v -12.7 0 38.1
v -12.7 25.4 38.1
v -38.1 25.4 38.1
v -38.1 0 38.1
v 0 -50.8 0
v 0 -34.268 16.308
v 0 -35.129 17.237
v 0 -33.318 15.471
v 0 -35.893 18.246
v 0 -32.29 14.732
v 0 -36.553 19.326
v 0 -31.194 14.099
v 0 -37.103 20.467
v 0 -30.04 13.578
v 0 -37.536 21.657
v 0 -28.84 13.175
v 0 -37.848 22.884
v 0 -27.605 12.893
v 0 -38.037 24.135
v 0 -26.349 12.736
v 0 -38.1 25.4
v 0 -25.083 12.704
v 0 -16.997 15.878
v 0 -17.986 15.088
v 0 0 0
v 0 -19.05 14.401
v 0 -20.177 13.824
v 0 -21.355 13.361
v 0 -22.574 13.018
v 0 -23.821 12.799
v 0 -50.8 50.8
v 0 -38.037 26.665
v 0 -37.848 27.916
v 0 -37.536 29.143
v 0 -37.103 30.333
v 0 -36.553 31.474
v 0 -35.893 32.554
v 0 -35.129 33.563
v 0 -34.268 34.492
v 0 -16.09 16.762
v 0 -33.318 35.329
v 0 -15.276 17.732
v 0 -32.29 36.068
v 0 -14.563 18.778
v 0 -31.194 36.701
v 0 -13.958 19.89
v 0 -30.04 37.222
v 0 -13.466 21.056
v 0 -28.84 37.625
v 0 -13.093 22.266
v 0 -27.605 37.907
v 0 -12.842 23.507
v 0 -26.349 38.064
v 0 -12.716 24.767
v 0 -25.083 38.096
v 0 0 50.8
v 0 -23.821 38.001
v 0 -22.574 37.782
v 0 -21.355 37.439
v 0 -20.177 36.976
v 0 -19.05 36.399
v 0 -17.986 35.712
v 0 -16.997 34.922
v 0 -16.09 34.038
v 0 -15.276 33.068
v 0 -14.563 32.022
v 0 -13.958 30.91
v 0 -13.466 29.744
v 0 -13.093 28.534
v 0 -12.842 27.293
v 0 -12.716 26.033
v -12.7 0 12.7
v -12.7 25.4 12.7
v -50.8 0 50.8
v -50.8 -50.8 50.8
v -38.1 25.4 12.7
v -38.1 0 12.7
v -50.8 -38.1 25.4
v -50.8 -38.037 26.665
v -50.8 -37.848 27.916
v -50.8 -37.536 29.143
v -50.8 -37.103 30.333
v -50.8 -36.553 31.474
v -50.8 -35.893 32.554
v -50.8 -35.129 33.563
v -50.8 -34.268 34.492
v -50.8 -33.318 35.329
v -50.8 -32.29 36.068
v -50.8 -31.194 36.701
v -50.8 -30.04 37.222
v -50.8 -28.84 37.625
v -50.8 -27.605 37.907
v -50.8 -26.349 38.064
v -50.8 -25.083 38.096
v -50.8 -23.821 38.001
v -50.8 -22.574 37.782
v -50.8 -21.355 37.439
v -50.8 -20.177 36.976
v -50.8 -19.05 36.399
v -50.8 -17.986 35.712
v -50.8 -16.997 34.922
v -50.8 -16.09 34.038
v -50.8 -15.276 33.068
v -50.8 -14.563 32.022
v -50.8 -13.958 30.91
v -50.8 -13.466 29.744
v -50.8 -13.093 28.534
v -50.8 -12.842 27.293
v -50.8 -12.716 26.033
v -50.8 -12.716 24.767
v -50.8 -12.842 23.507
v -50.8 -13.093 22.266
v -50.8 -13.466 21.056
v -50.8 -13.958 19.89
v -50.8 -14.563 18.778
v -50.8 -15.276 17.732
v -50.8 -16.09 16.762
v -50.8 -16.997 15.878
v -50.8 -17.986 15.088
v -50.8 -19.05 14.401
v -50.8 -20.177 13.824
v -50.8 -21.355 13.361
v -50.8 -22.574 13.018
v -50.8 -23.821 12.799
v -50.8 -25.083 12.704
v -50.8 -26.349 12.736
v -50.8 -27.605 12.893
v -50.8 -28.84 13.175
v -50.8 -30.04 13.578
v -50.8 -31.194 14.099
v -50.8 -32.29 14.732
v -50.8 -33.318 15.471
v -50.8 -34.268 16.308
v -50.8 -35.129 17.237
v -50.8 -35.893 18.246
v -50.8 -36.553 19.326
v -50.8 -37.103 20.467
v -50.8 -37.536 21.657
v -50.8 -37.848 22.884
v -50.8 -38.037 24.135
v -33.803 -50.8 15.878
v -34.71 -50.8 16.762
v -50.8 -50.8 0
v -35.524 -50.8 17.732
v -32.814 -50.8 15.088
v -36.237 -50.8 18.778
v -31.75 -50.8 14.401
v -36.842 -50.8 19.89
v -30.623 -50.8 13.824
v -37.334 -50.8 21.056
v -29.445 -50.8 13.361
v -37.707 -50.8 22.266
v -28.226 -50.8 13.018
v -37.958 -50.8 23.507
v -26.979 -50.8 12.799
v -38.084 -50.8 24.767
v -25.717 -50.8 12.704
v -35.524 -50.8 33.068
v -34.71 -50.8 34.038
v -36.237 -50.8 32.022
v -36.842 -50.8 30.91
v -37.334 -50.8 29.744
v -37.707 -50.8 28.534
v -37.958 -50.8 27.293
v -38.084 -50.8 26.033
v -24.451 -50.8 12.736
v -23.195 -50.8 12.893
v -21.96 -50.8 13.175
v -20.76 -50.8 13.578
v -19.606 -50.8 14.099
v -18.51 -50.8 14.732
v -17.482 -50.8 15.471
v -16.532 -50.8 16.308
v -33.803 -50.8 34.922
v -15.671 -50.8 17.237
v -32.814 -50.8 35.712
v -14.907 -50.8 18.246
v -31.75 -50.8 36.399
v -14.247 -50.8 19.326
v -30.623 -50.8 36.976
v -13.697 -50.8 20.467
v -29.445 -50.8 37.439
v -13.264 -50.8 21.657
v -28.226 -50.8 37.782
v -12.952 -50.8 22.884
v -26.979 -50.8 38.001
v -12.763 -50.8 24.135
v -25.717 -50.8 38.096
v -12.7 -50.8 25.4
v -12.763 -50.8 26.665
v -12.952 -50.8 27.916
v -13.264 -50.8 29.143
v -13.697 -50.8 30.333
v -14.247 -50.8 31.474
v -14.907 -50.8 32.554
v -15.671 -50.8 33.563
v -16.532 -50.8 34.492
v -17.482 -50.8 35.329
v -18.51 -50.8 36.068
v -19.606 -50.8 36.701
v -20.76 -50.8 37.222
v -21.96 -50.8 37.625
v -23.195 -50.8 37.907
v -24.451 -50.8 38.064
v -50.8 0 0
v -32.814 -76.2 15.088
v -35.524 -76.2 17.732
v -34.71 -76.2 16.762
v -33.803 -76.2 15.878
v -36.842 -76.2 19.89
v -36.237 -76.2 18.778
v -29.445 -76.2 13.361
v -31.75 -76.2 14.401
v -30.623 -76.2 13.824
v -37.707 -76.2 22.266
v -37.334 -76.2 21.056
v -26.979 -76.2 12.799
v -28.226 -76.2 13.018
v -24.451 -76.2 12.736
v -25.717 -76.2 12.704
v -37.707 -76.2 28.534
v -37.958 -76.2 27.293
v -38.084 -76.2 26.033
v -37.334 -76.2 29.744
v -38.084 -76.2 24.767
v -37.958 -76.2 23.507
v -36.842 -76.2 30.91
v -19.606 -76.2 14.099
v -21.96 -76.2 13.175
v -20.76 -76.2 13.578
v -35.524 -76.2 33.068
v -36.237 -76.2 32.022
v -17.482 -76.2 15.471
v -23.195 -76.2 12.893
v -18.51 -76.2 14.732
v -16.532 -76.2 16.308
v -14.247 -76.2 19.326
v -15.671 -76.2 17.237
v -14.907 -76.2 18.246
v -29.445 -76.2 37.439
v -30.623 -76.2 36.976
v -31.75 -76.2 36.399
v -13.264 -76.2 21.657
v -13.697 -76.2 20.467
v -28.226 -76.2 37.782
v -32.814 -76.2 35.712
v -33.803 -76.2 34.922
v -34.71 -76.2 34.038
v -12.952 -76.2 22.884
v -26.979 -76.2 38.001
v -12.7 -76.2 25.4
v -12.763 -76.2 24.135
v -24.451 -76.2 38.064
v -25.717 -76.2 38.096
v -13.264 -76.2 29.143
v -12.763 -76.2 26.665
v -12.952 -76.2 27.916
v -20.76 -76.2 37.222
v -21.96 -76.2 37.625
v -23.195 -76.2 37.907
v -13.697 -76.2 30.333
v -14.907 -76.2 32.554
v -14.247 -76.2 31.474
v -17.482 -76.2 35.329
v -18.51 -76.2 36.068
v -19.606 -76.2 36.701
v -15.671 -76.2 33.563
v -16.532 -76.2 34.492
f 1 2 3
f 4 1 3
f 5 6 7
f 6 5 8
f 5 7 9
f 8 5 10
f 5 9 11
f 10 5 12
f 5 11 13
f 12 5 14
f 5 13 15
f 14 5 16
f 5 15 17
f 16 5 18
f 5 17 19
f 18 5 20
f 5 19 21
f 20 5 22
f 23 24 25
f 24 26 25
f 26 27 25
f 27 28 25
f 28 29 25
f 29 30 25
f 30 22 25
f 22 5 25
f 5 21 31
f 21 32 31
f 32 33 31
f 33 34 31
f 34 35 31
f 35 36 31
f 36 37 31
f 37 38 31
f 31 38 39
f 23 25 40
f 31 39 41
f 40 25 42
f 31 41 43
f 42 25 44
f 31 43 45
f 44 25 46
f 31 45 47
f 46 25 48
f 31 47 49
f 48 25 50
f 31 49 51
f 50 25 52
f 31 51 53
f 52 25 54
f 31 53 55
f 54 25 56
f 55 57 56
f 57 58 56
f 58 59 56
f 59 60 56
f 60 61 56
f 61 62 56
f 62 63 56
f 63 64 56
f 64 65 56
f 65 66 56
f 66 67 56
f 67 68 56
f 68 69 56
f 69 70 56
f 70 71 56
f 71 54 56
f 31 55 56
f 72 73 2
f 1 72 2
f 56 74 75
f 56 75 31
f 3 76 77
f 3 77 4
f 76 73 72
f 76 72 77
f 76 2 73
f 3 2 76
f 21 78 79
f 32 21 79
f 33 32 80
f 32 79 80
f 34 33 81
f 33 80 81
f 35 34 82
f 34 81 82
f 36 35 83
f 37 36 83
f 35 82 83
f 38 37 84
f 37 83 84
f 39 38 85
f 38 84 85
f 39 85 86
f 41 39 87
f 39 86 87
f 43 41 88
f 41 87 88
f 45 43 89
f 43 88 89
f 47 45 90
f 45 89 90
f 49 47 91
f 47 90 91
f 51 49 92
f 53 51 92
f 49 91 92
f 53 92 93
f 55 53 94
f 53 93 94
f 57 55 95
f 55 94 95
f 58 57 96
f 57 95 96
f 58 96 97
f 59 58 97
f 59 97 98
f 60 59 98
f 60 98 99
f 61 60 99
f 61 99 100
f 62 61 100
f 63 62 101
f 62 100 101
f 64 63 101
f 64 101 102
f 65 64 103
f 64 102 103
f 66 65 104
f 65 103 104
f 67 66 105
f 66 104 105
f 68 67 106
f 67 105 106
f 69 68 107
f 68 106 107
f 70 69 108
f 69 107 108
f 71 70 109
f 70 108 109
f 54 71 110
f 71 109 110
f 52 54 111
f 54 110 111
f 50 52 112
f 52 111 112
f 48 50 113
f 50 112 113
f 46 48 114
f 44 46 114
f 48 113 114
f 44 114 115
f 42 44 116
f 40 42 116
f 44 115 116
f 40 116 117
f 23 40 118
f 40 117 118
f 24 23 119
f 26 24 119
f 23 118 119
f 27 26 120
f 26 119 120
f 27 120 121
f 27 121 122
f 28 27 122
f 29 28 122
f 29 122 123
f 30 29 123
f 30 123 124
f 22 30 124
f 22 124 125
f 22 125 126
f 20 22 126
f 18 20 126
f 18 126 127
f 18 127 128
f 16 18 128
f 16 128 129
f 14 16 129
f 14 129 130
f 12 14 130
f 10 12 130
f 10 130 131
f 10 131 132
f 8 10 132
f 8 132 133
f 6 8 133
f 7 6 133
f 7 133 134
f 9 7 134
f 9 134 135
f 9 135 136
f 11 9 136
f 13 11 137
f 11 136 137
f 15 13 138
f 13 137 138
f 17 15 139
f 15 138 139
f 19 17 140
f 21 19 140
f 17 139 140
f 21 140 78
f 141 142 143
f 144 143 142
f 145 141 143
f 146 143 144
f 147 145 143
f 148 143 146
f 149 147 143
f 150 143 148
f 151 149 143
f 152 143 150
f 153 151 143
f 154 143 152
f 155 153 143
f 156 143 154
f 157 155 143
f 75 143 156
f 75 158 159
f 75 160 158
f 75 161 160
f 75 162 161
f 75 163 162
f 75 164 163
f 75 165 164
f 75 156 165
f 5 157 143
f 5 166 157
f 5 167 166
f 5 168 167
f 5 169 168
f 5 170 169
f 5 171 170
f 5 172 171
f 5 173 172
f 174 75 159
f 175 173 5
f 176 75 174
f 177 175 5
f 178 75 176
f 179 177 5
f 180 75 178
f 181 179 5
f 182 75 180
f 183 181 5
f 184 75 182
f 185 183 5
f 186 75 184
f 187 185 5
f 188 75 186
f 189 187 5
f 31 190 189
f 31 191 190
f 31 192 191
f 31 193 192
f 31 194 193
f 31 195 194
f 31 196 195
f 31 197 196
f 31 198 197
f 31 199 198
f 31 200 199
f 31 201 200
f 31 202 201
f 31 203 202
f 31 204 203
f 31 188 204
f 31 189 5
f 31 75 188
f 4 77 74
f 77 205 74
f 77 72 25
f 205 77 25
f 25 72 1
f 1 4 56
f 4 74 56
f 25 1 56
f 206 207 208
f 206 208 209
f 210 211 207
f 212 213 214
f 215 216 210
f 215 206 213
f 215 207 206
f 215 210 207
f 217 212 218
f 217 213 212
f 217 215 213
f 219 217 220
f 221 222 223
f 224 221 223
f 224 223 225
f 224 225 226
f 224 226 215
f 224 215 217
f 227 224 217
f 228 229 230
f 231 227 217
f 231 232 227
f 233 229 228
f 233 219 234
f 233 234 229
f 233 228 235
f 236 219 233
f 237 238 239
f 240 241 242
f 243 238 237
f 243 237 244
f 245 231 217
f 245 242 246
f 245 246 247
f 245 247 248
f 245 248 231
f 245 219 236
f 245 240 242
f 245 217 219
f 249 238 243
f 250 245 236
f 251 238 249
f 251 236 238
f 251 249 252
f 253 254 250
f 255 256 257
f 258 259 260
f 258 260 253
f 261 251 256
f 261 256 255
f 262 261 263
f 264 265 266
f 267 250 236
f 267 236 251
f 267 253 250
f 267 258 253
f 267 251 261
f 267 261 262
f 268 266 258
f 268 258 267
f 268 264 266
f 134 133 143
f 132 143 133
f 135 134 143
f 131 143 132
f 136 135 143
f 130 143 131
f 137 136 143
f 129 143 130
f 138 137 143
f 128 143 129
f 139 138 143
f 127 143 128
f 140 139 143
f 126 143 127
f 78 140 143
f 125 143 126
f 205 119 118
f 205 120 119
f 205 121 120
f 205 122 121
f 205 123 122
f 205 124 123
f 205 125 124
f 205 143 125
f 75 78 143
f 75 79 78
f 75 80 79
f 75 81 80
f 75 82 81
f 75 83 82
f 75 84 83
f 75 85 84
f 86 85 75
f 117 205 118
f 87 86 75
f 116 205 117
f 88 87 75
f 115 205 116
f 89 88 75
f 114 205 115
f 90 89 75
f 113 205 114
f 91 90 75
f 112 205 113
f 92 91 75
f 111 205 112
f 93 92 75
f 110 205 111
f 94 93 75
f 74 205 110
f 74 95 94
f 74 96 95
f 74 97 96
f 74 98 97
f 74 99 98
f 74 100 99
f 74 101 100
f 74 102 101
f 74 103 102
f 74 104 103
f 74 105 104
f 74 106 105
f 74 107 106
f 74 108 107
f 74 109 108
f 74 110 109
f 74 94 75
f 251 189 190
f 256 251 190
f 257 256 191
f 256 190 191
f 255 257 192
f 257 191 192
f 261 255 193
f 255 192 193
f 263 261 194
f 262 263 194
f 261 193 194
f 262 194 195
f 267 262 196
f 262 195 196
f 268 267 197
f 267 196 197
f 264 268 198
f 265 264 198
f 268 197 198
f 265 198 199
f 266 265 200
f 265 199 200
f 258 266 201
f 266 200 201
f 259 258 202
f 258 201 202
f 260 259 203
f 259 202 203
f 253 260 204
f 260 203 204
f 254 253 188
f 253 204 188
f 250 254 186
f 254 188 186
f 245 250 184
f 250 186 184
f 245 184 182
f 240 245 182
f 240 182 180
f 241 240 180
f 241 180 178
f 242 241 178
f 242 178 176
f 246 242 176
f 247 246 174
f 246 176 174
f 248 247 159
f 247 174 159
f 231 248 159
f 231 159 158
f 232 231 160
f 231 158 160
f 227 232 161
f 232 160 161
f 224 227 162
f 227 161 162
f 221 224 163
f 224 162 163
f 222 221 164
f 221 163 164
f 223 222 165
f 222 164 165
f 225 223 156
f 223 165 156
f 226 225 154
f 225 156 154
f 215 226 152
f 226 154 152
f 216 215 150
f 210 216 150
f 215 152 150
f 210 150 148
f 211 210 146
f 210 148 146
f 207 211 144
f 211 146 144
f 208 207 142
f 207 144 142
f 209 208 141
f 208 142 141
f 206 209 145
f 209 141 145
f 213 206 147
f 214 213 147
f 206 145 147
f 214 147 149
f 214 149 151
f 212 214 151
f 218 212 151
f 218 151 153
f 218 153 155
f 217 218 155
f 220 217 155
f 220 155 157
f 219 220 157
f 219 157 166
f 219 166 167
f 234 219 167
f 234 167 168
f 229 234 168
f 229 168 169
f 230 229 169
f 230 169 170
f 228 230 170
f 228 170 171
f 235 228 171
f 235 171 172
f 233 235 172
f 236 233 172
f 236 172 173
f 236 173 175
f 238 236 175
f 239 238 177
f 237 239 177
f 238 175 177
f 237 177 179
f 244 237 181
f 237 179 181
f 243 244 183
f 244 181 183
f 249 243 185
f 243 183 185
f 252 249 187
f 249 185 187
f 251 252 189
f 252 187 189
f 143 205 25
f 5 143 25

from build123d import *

# Parameters (mm, degrees)
F0_W     = 50.8
F0_H     = 50.8
F1_DEPTH = 50.8
F2_R     = 12.7
F3_DEPTH = 25.4
F4_R     = 12.7
F5_DEPTH = 50.8
F6_W     = 25.4
F6_H     = 25.4
F7_DEPTH = 25.4


with BuildPart() as f1:
    # F0 (on Front) → F1 (new body)
    with BuildSketch(Plane.XZ):
        with Locations((-25.4, 25.4)):
            Rectangle(F0_W, F0_H)
    extrude(amount=F1_DEPTH)

    # F2 (on face) → F3 (join)
    with BuildSketch(Plane.XZ.offset(50.8)):
        with Locations((-25.4, 25.4)):
            Circle(F2_R)
    extrude(amount=F3_DEPTH)

    # F4 (on face) → F5 (cut)
    with BuildSketch(Plane(origin=(-50.8, 0, 0), x_dir=(0, -1, 0), z_dir=(-1, 0, 0))):
        with Locations((25.4, 25.4)):
            Circle(F4_R)
    extrude(amount=-F5_DEPTH, mode=Mode.SUBTRACT)

    # F6 (on face) → F7 (join)
    with BuildSketch(Plane(origin=(0, 0, 0), x_dir=(-1, 0, 0), z_dir=(0, 1, 0))):
        with Locations((25.4, 25.4)):
            Rectangle(F6_W, F6_H)
    extrude(amount=F7_DEPTH)


solid = f1.part
